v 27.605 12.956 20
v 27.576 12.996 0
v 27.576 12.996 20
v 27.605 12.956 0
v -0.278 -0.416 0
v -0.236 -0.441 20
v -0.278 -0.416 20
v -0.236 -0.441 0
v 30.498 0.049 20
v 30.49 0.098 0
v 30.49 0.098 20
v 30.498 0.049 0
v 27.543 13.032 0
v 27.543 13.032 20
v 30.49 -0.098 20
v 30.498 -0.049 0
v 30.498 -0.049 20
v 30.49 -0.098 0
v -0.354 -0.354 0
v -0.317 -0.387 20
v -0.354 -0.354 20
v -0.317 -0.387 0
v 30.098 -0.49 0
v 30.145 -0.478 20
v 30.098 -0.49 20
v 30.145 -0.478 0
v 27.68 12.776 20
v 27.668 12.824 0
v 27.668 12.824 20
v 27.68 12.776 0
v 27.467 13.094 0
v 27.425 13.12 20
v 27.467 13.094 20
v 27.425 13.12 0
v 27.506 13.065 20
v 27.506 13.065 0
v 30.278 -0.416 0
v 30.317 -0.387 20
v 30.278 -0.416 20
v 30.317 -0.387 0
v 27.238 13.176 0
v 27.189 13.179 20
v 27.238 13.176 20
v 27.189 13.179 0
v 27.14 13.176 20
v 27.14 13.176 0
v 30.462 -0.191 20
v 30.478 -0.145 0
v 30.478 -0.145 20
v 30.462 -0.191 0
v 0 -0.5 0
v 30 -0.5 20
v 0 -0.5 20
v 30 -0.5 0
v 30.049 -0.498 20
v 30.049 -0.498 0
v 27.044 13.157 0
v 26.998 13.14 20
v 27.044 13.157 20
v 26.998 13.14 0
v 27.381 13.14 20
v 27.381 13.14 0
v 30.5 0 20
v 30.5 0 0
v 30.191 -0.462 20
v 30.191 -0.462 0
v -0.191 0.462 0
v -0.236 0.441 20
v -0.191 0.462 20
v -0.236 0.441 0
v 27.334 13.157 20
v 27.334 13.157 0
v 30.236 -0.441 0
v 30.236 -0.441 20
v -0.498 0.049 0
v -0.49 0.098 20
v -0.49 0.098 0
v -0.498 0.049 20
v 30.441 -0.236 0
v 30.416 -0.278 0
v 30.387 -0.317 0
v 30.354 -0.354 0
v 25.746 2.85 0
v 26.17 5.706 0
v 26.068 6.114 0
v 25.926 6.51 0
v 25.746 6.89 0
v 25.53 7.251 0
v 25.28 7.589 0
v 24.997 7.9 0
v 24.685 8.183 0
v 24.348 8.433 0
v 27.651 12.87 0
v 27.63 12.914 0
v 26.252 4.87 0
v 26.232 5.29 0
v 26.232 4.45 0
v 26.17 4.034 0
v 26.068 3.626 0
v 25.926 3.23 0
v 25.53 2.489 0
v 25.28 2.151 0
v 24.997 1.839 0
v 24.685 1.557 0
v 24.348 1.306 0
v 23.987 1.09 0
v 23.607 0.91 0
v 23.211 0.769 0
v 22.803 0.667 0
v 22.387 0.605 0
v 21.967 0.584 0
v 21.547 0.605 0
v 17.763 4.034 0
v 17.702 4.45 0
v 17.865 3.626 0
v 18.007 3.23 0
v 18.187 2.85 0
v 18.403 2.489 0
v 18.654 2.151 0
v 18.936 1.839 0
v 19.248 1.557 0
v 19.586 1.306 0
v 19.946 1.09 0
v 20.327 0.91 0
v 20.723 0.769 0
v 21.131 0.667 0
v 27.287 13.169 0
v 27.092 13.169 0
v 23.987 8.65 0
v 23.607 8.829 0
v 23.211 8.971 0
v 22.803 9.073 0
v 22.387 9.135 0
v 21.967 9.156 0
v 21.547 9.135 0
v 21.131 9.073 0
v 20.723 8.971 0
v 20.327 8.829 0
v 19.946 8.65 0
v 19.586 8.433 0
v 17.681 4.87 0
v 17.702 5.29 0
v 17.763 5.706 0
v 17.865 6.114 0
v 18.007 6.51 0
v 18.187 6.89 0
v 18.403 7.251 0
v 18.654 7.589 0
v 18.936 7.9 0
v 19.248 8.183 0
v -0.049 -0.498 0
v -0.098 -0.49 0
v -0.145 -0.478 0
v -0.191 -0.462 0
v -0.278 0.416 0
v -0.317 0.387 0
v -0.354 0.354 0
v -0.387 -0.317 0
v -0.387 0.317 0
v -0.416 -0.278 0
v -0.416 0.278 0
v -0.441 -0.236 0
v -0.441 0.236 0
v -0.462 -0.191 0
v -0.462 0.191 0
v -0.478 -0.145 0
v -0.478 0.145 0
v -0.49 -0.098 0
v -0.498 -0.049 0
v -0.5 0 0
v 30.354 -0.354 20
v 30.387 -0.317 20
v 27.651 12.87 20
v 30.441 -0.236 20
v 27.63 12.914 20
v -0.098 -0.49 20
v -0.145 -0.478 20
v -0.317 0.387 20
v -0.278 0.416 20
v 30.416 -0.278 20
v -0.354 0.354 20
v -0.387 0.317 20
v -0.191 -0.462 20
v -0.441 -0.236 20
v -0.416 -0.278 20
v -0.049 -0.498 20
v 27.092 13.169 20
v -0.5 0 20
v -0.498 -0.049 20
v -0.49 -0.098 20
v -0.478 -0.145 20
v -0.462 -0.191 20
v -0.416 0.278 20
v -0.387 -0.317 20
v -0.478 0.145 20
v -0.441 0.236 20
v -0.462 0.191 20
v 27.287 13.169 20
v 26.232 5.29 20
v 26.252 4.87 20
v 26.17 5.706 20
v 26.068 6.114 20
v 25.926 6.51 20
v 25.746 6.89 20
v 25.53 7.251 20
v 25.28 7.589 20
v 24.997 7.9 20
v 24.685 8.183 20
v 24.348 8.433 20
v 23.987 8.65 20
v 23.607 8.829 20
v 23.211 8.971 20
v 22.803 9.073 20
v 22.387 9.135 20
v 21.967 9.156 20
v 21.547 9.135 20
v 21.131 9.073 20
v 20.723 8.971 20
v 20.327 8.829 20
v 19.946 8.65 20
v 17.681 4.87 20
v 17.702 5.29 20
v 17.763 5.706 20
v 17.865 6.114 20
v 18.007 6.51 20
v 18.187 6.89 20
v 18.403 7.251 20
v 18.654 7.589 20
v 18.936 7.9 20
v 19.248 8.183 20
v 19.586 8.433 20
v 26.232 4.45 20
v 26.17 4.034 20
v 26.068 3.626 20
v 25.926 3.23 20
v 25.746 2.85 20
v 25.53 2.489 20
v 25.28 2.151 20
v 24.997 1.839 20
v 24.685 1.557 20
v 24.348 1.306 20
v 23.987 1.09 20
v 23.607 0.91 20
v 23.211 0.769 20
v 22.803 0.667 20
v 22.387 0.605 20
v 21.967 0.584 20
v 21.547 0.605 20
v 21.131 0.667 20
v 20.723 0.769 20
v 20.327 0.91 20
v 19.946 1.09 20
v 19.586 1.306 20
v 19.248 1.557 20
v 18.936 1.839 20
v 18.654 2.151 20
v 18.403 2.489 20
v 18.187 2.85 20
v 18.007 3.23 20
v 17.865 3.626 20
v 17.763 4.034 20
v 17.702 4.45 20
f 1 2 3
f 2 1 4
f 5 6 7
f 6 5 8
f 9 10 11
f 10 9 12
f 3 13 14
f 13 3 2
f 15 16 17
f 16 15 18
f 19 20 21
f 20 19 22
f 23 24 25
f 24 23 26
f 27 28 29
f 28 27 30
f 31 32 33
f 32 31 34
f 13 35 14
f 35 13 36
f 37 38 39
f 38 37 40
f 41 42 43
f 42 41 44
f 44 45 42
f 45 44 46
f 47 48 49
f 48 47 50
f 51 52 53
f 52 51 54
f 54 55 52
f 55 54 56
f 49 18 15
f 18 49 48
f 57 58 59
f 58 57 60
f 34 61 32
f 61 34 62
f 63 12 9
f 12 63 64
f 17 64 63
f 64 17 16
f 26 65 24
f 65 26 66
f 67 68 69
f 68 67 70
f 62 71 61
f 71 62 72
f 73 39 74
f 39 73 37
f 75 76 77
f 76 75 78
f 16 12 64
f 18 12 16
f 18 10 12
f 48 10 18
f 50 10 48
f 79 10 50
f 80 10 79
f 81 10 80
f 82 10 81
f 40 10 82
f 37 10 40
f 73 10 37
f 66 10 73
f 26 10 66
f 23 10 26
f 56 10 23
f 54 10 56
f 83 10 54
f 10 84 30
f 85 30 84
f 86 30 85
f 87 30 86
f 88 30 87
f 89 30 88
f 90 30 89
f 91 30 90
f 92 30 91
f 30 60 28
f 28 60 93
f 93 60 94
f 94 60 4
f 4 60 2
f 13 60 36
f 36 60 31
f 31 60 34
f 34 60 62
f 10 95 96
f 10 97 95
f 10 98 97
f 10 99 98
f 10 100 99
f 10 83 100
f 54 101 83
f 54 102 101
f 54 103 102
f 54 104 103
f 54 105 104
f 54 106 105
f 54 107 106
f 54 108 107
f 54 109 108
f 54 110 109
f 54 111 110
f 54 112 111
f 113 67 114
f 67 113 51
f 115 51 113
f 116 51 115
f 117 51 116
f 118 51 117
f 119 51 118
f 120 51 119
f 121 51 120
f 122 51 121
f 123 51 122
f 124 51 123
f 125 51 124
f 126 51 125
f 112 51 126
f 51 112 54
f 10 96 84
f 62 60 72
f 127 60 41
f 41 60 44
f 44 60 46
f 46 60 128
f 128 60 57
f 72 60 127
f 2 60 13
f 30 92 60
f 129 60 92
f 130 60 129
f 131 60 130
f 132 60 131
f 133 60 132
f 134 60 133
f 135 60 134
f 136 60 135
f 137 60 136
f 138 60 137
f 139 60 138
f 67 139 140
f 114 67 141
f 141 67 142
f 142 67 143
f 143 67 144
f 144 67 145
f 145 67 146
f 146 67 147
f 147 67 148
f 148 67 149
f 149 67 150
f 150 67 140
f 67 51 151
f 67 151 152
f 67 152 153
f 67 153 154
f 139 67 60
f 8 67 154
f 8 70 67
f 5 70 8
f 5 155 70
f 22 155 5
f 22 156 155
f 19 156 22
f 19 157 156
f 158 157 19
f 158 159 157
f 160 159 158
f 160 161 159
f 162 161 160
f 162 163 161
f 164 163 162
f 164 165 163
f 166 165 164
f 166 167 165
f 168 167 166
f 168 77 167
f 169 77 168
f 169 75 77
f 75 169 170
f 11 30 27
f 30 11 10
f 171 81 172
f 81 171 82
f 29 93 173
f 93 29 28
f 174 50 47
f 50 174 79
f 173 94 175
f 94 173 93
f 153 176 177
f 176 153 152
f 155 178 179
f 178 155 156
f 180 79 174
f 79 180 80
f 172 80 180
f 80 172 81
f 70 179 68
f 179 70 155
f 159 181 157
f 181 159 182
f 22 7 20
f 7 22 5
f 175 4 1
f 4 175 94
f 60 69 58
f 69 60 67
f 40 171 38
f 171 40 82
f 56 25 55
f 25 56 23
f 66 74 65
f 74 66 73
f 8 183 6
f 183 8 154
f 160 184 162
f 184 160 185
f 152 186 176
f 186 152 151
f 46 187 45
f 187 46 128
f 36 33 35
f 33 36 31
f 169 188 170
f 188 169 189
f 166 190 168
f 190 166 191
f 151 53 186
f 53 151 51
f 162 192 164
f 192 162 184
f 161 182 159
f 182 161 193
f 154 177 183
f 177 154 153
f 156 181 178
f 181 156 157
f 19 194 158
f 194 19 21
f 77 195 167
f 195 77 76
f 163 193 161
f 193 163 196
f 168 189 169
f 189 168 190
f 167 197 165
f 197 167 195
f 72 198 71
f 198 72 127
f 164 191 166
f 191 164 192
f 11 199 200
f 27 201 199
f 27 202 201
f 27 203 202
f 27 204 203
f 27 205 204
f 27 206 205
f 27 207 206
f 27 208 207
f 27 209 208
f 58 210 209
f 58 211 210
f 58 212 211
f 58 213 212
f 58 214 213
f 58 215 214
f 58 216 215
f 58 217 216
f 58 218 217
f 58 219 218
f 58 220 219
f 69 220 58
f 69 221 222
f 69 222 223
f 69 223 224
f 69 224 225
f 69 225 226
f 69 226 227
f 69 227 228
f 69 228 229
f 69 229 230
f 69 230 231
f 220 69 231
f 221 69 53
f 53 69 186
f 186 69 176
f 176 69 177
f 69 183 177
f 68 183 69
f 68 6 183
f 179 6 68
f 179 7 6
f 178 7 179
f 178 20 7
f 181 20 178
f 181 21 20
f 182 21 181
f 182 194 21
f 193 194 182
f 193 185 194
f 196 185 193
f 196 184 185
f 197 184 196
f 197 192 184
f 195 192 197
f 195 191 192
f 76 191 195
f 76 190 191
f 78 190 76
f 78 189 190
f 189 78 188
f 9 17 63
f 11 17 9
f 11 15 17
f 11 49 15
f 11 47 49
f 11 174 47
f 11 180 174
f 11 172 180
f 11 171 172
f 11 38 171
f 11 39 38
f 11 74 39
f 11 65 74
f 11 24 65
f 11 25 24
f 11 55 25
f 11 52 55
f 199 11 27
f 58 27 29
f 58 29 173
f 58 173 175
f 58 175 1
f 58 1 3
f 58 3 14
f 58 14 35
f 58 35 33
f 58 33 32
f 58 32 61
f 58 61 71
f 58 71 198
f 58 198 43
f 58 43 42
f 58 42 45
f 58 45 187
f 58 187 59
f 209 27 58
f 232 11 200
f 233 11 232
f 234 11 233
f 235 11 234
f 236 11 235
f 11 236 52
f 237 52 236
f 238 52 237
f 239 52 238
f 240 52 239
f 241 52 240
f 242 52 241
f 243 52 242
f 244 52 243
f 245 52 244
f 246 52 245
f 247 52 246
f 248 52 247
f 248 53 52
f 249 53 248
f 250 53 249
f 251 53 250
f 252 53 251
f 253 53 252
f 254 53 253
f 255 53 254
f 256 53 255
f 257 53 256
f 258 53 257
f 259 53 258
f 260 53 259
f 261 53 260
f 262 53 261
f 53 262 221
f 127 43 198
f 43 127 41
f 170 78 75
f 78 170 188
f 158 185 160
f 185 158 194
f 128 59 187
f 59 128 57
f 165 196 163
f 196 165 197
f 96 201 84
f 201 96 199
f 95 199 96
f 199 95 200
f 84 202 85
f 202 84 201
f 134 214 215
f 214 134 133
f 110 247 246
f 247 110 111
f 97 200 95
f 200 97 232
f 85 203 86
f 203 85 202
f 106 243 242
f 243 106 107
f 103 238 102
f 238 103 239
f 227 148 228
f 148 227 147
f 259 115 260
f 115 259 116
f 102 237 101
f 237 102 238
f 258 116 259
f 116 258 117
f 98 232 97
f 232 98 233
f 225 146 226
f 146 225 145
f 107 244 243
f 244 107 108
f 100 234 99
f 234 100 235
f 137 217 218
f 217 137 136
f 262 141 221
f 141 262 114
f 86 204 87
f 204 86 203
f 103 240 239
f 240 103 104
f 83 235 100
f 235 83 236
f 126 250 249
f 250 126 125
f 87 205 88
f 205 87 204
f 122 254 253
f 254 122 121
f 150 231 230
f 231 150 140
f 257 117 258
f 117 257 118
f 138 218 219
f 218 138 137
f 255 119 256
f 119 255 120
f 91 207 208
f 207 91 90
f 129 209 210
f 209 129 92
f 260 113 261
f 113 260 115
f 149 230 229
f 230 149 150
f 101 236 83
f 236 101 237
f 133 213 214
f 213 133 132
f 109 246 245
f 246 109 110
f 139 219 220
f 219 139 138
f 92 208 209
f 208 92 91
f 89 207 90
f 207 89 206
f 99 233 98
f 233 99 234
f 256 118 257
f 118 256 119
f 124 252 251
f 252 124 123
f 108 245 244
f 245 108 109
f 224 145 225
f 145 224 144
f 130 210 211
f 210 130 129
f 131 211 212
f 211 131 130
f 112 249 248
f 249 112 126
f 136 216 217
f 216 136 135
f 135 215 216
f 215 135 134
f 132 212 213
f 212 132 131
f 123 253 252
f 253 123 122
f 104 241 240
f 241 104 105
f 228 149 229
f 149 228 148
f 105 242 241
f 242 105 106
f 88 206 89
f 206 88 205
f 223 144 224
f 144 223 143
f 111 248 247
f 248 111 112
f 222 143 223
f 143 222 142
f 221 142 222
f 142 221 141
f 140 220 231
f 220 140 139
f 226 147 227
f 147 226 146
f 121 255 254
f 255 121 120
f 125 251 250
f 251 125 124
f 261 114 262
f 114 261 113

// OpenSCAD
/**
 * Martin Egli
 * 2024-09-17
 */

module angle_stop(ang = 30, loc_res = 32) {
    r1 = 0.5;
    r2 = 30;
    r3 = 6;
    h1 = 20;
    difference() {
        hull() {
            translate([0, 0, 0])
            cylinder(r = r1, h = h1, $fn = loc_res);
            translate([r2*cos(0), r2*sin(0), 0])
            cylinder(r = r1, h = h1, $fn = loc_res);
            translate([r2*cos(ang), r2*sin(ang), 0])
            cylinder(r = r1, h = h1, $fn = loc_res);
        }

        translate([3/4*r2*cos(ang/2), 3/4*r2*sin(ang/2), -1])
        cylinder(r = 1/7*r2, h = h1+2, $fn = loc_res);
    }
}
*angle_stop(ang = 30, loc_res = 64);
angle_stop(ang = 25, loc_res = 64);
